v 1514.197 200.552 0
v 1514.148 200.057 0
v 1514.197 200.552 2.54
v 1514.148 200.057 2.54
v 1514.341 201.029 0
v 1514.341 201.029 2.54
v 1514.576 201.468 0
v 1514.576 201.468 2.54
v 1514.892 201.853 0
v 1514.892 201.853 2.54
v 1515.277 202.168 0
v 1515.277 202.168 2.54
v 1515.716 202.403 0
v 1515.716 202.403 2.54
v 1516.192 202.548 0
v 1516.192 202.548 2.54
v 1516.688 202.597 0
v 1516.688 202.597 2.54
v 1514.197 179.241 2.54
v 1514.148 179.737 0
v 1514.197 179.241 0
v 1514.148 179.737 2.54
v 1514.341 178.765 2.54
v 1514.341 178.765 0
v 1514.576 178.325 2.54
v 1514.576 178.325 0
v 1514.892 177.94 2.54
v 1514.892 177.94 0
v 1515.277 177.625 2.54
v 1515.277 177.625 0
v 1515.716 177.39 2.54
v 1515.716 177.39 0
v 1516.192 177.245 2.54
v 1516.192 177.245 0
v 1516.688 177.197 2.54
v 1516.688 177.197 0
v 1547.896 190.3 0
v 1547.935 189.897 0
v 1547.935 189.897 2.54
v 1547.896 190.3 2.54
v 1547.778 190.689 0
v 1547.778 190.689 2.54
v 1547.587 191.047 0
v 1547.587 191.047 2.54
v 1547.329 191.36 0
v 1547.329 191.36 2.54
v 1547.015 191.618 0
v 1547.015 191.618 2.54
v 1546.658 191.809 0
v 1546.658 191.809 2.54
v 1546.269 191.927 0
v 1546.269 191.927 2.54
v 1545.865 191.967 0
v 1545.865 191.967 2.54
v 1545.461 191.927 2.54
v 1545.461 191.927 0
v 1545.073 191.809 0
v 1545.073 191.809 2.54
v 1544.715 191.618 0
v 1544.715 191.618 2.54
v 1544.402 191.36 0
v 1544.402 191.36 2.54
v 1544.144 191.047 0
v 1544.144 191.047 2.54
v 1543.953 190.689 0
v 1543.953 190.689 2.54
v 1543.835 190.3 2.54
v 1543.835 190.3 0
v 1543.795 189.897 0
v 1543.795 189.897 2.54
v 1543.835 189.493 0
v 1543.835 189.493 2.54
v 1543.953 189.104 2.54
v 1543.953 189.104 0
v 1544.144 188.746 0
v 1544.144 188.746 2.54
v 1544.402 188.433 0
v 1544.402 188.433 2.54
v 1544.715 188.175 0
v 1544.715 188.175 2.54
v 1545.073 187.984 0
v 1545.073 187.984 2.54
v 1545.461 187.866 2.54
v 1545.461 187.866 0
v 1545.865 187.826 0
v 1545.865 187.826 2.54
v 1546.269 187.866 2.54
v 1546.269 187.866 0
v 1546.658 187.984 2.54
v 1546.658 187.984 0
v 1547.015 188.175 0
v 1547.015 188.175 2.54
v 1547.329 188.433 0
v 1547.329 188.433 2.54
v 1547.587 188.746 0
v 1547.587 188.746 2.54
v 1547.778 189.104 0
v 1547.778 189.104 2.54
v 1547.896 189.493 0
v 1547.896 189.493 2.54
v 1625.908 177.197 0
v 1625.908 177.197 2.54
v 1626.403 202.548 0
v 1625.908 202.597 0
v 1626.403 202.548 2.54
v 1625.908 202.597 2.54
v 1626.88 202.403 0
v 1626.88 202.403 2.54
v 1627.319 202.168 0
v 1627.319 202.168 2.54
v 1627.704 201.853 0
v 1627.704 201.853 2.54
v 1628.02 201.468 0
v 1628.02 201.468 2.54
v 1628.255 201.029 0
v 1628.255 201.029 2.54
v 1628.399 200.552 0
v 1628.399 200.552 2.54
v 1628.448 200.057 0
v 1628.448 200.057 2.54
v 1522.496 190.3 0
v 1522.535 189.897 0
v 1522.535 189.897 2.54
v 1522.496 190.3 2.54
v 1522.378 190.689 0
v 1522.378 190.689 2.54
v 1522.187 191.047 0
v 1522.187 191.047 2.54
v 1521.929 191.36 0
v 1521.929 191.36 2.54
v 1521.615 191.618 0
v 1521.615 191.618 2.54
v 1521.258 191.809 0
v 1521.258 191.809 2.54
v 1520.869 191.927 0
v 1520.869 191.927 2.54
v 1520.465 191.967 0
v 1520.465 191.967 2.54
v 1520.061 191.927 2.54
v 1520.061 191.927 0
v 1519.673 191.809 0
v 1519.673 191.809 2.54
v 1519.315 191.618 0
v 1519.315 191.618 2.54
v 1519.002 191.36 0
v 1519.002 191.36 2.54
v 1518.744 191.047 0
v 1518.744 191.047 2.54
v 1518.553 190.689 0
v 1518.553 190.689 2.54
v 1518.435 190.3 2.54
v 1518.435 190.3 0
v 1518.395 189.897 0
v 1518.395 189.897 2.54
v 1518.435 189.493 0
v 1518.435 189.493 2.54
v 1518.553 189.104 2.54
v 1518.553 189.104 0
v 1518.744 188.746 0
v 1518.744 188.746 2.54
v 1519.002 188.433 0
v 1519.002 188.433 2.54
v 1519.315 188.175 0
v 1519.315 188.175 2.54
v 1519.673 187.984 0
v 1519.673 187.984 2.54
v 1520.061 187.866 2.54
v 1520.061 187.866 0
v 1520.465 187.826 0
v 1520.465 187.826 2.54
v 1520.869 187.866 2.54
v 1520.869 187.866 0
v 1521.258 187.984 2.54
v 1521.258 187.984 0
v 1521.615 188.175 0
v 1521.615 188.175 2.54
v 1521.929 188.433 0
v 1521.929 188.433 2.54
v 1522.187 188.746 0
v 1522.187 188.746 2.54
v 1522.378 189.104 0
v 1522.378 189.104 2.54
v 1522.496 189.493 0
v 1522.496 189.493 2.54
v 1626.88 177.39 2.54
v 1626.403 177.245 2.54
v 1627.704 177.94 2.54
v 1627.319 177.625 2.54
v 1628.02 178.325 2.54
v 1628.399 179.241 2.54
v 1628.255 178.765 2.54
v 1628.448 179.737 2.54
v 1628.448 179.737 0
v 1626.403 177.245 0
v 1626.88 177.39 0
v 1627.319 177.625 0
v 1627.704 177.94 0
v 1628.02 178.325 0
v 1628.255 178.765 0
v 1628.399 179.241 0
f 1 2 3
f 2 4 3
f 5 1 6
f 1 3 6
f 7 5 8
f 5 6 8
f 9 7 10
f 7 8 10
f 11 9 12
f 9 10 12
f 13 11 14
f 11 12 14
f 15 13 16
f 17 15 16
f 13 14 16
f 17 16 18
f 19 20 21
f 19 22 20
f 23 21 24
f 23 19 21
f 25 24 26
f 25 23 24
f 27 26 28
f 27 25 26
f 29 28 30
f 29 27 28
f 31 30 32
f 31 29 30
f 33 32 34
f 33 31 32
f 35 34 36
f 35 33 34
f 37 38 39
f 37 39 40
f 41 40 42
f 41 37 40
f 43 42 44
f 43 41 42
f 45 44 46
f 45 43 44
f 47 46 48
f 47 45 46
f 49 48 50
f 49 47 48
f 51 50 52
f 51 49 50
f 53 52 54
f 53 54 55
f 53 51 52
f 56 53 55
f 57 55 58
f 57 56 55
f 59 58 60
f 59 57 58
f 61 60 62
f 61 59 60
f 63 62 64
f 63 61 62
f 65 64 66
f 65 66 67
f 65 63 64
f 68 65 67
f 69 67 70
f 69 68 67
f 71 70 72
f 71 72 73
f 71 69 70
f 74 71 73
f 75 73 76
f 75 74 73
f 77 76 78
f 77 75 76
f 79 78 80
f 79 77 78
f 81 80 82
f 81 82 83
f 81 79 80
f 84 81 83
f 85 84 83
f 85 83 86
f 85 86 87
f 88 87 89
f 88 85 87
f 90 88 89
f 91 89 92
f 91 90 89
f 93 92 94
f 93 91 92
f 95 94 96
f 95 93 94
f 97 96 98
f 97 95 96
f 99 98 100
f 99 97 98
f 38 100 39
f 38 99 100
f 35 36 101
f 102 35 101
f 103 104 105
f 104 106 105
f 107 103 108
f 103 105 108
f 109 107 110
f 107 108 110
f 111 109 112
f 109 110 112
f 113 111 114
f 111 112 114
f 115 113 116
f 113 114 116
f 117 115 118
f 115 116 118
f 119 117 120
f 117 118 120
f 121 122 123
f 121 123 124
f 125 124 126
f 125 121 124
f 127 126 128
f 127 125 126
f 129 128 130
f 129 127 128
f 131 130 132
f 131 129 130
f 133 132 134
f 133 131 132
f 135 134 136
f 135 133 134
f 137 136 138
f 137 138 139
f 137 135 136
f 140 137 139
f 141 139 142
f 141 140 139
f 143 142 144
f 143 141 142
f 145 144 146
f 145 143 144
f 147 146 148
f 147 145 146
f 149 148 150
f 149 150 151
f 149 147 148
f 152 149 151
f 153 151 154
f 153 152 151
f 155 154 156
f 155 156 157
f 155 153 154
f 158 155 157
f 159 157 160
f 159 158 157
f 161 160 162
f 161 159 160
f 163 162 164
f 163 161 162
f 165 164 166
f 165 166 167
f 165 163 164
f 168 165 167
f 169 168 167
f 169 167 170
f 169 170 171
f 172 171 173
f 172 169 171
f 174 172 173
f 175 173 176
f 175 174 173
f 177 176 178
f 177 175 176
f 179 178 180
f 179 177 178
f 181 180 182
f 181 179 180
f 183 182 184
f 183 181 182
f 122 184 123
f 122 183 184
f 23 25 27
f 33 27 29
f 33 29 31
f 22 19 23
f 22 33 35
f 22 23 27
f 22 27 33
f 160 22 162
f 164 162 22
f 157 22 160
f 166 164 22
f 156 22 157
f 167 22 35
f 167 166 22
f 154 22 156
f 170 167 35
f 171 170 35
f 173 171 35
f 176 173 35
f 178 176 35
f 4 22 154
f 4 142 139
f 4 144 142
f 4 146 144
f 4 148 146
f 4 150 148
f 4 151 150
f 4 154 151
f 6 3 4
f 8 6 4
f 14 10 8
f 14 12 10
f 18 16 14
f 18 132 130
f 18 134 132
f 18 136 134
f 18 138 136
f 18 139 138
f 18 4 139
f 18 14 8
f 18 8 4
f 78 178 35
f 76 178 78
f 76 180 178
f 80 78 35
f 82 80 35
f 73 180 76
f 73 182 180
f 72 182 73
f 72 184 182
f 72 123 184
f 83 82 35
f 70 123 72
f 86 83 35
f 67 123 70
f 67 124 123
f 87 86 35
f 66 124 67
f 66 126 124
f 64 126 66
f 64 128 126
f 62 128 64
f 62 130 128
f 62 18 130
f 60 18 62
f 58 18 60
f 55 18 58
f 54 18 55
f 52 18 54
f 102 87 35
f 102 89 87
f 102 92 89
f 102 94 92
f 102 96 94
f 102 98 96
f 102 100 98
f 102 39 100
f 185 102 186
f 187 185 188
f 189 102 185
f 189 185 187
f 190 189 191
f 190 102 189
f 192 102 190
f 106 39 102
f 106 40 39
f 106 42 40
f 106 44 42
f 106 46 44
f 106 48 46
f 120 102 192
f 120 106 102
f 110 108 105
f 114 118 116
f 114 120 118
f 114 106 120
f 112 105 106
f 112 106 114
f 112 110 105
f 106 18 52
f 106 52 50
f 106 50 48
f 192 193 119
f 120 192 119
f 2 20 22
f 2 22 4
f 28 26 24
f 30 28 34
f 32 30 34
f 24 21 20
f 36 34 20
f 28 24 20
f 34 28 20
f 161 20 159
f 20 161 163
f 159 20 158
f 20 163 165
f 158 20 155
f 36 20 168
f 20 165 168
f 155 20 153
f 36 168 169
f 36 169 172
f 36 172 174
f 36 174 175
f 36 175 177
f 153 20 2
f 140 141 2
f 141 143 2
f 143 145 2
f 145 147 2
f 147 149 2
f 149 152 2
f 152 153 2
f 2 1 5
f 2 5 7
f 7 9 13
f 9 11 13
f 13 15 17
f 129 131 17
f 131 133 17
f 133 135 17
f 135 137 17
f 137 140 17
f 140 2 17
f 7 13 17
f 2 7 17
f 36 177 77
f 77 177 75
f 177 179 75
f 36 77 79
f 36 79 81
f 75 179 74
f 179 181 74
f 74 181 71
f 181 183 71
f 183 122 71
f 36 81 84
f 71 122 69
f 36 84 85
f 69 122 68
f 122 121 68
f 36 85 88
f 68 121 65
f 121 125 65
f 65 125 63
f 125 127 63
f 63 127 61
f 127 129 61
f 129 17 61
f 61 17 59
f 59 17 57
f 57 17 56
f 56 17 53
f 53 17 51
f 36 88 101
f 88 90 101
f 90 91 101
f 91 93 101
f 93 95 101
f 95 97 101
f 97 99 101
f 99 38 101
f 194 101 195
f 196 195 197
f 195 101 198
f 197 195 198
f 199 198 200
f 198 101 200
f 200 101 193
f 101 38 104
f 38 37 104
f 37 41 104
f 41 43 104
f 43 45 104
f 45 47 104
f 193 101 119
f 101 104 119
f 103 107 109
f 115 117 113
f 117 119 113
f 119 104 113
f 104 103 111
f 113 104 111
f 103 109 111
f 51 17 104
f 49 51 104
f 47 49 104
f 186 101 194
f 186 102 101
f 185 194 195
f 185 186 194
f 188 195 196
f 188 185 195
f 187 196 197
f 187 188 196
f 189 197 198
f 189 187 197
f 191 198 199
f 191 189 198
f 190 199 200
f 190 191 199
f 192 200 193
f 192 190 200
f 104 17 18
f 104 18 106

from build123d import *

# Parameters (mm, degrees)
SKETCH1_W           = 114.3
SKETCH1_H           = 25.4
SKETCH1_R           = 2.0701
BOSS_EXTRUDE1_DEPTH = 2.54
FILLET1_R           = 2.54


with BuildPart() as part:
    # Sketch1 → Boss-Extrude1 (new body)
    with BuildSketch(Plane.XY):
        with Locations((1571.297892637, 189.896529369)):
            Rectangle(SKETCH1_W, SKETCH1_H)
        with Locations((1545.865334821, 189.896529369)):
            Circle(SKETCH1_R, mode=Mode.SUBTRACT)
        with Locations((1520.465334821, 189.896529369)):
            Circle(SKETCH1_R, mode=Mode.SUBTRACT)
    extrude(amount=BOSS_EXTRUDE1_DEPTH)

    # Fillet1
    fillet1_edges = [part.edges().sort_by_distance(p)[0] for p in [
        (1628.447892637, 202.596529369, 1.27),
        (1628.447892637, 177.196529369, 1.27),
        (1514.147892637, 177.196529369, 1.27),
        (1514.147892637, 202.596529369, 1.27),
    ]]
    fillet(fillet1_edges, radius=FILLET1_R)


solid = part.part
